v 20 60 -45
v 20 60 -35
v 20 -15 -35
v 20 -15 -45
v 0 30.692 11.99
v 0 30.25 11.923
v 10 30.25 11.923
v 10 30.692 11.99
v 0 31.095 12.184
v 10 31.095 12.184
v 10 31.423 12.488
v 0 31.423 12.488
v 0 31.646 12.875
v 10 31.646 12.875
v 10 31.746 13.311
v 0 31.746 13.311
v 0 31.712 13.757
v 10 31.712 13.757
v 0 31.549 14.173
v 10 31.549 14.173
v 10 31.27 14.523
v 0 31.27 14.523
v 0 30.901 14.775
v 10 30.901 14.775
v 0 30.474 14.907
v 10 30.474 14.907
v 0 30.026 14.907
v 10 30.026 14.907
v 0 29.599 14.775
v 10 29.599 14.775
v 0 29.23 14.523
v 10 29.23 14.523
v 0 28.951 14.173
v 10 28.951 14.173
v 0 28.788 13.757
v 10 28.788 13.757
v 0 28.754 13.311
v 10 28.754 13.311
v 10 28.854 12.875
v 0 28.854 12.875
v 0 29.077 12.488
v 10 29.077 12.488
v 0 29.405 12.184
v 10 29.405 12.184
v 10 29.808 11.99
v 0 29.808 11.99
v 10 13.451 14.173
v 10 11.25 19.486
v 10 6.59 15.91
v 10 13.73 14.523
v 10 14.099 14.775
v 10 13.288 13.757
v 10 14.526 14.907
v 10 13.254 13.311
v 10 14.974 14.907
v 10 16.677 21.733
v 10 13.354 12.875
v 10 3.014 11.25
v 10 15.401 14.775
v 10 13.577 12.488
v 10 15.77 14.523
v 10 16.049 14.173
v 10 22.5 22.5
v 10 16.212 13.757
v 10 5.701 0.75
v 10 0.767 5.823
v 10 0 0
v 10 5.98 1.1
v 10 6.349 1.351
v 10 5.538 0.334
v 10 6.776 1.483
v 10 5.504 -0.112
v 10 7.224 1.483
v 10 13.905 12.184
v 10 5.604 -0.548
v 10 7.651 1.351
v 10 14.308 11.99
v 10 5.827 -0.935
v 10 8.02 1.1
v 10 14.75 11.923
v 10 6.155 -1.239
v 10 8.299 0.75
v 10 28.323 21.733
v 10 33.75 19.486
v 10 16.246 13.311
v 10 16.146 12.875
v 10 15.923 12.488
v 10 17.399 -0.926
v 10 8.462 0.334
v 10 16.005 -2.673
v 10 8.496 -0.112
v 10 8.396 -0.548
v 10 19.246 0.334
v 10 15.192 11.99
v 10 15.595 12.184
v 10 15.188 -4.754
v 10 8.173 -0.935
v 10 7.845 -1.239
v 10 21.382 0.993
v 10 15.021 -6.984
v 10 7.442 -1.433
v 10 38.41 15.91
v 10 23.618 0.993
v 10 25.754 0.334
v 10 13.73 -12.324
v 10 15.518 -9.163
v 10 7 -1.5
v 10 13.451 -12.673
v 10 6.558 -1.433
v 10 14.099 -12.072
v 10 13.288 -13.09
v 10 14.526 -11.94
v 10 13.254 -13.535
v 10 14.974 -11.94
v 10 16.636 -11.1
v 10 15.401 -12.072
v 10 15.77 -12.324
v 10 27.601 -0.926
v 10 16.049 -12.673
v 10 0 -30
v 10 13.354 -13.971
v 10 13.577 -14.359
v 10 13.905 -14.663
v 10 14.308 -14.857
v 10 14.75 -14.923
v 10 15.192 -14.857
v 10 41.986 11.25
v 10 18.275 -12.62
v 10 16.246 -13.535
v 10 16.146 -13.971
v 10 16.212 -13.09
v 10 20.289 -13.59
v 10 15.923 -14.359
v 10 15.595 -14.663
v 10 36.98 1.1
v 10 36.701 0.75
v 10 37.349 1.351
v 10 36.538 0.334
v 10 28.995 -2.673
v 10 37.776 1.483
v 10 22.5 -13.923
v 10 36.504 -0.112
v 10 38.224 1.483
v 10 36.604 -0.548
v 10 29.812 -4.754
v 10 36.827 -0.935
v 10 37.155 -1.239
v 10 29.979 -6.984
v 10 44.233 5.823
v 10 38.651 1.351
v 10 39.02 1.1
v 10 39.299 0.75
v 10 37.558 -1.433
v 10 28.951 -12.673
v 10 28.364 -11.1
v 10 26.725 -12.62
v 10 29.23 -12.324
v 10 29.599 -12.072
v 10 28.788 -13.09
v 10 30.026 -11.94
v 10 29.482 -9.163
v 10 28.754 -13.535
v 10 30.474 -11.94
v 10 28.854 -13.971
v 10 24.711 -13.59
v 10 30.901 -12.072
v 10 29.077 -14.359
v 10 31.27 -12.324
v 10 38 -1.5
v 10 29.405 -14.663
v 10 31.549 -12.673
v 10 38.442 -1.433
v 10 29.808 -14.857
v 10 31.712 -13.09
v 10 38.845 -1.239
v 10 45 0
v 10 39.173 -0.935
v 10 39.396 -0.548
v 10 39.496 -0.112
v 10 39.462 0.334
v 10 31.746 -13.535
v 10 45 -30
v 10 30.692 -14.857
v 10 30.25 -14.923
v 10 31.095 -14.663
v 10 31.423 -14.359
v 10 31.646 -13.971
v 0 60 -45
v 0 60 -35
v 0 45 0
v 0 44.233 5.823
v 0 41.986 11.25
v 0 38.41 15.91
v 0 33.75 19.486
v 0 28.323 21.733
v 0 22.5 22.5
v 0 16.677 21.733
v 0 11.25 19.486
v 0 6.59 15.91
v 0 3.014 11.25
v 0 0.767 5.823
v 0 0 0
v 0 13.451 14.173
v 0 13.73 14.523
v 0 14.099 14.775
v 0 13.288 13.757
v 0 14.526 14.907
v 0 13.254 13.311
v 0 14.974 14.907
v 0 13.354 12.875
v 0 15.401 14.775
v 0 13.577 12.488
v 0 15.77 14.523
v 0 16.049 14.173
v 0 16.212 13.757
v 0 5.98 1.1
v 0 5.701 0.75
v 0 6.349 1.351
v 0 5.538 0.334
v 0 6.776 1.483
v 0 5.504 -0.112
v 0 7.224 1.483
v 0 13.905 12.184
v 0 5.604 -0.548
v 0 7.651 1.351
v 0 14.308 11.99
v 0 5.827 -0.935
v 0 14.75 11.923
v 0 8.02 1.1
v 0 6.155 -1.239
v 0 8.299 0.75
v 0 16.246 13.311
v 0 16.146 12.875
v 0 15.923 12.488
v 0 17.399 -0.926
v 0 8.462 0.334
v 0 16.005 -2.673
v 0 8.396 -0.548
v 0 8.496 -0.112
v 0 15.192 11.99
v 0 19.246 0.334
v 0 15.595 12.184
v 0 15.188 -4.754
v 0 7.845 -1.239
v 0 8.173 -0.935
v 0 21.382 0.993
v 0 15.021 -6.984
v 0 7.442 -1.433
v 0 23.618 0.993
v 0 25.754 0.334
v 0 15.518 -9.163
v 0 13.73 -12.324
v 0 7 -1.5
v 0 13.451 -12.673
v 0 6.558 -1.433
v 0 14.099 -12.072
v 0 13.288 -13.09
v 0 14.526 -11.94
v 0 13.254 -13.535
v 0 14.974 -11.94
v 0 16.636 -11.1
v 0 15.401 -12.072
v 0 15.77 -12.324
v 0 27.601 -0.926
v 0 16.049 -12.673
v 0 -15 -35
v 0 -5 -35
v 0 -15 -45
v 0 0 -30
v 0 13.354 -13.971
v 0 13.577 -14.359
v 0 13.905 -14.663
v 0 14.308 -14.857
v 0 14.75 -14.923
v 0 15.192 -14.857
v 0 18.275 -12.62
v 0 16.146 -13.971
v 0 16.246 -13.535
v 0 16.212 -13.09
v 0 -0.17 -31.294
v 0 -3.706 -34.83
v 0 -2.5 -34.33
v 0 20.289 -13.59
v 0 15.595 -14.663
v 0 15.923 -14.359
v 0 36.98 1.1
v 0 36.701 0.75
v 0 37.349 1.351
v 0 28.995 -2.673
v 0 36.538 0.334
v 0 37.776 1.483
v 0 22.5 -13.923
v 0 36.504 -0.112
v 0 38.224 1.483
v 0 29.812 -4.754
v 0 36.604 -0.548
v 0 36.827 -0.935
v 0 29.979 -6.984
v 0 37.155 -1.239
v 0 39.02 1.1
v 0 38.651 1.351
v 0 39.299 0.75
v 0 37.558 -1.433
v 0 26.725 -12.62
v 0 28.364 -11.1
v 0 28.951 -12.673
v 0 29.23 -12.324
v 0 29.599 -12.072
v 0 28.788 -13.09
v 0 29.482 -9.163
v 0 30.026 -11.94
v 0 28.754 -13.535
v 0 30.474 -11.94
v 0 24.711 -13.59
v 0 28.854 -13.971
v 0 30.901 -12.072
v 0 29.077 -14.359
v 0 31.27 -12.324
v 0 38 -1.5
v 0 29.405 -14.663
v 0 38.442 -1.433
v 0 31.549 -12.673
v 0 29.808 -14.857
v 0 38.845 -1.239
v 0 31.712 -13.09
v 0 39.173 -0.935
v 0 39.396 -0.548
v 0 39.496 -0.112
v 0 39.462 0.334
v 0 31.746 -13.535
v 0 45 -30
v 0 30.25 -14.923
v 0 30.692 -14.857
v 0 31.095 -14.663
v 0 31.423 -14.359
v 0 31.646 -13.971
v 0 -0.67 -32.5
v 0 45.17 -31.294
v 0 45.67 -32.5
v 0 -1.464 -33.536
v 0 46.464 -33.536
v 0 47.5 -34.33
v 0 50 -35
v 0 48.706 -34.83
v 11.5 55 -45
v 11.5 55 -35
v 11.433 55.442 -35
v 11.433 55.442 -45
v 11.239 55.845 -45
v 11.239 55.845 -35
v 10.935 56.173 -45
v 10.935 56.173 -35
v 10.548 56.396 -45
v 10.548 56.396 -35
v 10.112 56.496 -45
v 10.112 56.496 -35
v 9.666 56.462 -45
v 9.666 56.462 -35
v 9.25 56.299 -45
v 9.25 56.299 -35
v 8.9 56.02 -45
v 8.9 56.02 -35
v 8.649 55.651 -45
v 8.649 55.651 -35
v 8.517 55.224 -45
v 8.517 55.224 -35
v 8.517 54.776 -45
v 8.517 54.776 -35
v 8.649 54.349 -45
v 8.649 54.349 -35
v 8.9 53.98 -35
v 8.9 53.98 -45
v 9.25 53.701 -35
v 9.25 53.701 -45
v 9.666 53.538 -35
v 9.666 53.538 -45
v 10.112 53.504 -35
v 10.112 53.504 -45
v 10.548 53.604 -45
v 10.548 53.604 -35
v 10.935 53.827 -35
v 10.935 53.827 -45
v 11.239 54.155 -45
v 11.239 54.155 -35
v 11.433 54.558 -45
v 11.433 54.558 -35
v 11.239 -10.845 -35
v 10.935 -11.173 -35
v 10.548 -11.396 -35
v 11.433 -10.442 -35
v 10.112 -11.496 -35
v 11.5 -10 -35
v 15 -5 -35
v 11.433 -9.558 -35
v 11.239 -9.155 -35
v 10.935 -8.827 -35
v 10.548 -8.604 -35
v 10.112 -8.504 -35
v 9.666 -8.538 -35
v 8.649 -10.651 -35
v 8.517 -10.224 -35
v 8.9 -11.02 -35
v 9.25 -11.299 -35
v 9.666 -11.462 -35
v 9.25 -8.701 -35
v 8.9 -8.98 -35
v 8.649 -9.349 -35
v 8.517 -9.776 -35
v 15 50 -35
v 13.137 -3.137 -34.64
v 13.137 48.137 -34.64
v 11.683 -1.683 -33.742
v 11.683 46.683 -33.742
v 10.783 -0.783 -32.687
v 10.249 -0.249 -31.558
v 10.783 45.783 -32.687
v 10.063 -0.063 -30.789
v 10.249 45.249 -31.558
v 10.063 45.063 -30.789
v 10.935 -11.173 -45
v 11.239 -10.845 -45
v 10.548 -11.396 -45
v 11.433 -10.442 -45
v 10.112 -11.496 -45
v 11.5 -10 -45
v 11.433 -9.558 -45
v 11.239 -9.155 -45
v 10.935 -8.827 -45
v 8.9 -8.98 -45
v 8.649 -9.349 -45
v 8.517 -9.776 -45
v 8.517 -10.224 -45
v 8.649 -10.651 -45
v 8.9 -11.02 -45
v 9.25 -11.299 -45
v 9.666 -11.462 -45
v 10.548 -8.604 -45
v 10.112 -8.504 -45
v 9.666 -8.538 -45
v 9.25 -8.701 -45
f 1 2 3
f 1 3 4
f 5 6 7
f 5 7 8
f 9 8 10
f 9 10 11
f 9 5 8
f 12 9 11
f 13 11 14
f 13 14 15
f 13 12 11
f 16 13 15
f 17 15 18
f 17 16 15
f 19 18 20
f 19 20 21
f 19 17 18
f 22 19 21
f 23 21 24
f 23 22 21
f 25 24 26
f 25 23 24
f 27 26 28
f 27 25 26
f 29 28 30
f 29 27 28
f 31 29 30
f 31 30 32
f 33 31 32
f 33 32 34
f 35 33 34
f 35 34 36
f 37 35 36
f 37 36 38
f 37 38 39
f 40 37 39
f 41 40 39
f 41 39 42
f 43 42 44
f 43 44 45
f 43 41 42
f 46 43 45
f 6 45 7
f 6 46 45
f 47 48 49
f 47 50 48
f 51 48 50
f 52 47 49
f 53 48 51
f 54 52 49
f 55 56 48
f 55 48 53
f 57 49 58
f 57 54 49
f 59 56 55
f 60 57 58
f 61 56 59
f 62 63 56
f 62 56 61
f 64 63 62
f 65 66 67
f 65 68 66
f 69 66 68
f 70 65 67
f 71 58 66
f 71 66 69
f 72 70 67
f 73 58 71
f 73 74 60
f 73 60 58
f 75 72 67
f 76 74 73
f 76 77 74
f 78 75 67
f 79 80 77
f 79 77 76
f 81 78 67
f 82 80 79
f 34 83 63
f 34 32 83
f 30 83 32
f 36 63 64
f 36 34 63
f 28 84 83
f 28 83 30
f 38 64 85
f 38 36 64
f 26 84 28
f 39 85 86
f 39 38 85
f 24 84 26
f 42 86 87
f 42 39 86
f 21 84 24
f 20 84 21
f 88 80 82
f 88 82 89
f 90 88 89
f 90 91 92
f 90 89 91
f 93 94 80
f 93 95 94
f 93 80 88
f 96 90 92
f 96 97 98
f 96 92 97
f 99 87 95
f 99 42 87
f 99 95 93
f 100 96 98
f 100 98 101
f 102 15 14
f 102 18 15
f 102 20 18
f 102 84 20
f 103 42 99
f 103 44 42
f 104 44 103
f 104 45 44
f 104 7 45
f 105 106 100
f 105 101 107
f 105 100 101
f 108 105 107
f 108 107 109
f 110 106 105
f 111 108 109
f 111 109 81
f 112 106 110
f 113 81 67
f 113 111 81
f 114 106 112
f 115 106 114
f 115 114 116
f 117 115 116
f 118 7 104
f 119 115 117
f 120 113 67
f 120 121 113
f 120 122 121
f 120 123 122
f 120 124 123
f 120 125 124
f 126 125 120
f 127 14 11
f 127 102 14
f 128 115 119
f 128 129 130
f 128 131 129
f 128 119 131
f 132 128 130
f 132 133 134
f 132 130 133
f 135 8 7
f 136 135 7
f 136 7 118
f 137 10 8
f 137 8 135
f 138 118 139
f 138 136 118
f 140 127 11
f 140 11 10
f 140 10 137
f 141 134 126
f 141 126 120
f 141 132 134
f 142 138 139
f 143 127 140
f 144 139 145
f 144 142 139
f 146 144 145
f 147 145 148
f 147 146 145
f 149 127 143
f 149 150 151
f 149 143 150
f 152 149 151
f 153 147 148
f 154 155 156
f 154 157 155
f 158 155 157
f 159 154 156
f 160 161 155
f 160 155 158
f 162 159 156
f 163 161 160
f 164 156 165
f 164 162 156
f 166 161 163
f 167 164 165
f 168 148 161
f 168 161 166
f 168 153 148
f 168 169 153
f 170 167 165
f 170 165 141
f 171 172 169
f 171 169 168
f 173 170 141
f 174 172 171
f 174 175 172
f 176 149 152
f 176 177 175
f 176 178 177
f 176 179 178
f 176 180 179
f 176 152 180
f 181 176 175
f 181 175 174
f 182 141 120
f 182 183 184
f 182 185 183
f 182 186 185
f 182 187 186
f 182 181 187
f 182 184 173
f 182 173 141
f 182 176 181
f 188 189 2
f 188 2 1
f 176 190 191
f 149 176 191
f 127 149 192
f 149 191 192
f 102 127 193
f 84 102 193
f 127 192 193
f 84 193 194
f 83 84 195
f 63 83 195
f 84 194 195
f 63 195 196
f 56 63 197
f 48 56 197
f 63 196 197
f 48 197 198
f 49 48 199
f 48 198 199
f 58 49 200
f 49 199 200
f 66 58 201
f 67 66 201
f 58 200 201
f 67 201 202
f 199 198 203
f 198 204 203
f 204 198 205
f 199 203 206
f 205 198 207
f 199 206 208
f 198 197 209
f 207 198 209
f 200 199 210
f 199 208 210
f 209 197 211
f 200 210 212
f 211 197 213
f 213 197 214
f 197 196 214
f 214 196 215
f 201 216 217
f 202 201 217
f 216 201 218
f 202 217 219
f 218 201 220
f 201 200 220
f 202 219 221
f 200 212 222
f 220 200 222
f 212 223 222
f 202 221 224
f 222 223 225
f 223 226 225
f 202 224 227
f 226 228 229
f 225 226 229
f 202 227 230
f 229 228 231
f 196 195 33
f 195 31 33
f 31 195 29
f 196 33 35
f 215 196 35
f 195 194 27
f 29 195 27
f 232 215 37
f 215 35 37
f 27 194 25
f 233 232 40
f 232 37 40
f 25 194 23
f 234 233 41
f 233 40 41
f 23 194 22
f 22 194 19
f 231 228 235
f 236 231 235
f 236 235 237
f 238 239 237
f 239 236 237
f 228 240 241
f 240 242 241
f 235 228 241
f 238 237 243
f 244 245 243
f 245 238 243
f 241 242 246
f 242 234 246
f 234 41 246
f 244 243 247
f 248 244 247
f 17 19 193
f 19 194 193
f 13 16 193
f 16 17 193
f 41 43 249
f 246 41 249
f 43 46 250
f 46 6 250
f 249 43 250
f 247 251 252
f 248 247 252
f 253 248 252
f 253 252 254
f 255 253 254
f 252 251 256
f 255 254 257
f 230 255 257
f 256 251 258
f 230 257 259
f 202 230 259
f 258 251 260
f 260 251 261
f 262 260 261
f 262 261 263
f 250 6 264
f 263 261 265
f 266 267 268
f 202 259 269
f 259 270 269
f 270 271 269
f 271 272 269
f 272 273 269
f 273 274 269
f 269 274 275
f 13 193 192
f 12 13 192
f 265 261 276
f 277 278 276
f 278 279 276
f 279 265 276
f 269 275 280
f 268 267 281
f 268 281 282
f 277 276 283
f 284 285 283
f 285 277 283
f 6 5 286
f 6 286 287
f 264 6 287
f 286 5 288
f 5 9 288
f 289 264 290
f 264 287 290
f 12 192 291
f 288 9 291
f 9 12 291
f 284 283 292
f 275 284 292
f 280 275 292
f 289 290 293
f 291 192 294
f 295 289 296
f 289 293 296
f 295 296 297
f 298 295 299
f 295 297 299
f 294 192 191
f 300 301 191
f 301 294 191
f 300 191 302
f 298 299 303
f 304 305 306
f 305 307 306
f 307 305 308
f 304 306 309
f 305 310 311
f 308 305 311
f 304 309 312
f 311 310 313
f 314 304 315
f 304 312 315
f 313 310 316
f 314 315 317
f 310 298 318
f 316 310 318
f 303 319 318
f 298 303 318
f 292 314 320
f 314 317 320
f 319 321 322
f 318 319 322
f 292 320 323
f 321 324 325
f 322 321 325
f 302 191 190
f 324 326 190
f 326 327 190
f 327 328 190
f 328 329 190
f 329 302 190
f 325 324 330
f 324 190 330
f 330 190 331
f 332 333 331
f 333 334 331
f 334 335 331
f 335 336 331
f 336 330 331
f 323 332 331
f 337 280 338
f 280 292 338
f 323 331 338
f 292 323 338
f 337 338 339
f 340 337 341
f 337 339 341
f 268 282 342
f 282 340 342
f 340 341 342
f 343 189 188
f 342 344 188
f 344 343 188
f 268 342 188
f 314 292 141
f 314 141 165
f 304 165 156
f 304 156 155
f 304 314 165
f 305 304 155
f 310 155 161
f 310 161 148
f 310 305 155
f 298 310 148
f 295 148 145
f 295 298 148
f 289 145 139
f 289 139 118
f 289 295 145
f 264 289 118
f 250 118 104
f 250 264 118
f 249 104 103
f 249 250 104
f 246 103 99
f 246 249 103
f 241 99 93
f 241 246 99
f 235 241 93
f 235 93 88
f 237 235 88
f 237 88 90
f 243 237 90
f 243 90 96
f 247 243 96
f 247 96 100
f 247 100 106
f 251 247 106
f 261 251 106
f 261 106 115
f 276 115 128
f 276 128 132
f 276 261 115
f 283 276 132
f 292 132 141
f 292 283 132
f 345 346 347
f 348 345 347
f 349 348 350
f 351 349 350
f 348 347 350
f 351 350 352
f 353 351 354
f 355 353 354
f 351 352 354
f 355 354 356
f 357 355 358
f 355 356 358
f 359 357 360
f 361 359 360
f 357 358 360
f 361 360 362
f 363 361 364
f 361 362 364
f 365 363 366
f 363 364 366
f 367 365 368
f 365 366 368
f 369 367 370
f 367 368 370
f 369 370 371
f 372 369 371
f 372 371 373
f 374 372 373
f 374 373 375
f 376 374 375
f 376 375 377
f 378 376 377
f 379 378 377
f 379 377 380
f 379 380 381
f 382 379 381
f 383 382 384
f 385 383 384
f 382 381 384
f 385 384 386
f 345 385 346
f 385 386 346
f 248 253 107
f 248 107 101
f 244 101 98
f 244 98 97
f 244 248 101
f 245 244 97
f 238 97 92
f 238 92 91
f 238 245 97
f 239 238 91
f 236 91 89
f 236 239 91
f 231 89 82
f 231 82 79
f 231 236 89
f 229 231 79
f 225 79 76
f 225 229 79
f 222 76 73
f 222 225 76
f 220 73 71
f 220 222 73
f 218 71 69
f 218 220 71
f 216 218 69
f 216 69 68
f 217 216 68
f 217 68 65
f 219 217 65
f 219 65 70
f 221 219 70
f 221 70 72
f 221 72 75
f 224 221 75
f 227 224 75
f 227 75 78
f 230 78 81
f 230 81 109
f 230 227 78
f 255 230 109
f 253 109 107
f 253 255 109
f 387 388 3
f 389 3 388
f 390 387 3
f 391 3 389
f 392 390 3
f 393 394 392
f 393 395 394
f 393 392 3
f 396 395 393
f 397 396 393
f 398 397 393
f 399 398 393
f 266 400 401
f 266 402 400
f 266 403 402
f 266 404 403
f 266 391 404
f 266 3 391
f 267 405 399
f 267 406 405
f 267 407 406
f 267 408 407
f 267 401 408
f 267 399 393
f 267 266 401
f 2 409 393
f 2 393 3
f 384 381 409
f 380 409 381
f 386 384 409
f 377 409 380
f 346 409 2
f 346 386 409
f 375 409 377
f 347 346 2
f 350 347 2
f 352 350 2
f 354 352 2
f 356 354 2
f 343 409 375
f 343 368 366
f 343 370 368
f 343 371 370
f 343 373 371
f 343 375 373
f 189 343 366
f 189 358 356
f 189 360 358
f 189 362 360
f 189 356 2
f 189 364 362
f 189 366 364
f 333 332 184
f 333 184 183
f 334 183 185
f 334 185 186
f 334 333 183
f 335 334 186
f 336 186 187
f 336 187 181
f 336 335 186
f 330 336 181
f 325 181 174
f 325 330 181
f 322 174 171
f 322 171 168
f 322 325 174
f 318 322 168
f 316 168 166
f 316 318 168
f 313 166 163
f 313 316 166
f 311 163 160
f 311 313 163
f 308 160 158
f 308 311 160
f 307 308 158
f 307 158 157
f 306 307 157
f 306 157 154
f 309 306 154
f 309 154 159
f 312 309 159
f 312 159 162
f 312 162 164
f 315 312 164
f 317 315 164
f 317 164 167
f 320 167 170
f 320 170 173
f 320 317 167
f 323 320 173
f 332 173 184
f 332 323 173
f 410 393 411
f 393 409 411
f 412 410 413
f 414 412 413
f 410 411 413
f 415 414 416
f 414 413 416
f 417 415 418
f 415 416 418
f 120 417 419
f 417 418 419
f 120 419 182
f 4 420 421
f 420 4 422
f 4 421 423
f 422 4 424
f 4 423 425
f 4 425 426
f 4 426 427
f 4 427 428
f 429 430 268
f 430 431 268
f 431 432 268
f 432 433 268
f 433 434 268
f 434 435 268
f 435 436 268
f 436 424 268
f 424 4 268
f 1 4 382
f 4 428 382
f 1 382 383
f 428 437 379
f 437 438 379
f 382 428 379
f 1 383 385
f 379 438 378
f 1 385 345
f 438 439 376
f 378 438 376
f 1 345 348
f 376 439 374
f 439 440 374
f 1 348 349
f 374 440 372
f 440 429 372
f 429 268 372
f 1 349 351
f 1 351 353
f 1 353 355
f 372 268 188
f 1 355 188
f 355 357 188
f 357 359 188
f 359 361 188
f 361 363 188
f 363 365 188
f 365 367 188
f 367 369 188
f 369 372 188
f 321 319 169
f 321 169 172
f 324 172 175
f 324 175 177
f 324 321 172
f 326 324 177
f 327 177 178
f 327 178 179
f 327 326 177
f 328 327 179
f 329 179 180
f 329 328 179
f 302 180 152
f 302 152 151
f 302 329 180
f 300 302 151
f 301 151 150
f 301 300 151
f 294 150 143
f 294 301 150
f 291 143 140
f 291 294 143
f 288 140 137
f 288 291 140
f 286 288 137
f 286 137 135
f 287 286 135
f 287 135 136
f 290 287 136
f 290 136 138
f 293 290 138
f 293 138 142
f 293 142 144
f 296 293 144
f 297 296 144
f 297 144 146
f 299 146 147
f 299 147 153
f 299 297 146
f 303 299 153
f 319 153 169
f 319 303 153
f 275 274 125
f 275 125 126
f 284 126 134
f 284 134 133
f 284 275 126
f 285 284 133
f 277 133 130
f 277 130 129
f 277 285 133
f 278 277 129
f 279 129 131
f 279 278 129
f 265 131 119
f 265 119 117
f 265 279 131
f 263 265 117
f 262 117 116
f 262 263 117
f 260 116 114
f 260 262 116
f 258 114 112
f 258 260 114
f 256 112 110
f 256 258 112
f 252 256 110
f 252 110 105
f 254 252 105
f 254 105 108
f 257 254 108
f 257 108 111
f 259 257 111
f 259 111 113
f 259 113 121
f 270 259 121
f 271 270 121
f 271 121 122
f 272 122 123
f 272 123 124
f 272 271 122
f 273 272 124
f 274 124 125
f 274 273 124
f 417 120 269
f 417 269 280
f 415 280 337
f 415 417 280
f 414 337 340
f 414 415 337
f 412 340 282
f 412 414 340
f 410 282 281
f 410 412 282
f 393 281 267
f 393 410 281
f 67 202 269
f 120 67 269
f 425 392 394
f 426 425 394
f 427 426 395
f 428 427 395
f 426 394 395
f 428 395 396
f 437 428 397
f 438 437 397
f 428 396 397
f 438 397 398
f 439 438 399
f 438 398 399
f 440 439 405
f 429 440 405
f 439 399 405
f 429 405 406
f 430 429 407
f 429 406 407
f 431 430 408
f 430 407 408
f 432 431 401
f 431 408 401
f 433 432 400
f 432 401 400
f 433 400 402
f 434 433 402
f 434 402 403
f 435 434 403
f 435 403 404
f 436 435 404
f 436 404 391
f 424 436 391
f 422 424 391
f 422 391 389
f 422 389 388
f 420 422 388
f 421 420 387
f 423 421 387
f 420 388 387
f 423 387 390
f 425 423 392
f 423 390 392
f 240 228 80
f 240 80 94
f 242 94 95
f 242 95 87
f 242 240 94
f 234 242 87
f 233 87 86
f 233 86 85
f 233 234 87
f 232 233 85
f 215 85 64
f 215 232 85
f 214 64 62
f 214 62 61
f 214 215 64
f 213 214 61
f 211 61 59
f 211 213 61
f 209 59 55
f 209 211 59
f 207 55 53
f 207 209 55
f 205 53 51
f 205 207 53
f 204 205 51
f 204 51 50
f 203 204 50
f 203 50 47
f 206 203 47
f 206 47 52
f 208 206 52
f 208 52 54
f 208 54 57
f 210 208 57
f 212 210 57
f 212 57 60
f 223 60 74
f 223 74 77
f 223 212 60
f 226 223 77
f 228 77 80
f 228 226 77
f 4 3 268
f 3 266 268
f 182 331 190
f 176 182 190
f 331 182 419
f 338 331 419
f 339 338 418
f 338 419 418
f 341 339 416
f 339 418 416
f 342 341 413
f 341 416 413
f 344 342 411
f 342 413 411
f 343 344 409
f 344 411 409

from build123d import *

# Parameters (mm, degrees)
SKETCH1_R           = 7.5
SKETCH1_R_2         = 1.5
BOSS_EXTRUDE1_DEPTH = 10
FILLET1_R           = 5
FILLET2_R           = 5
SKETCH2_W           = 10
SKETCH2_H           = 75
BOSS_EXTRUDE2_DEPTH = 10
FILLET3_R           = 5
SKETCH3_R           = 1.5
CUT_EXTRUDE1_DEPTH  = 10


with BuildPart() as part:
    # Sketch1 → Boss-Extrude1 (new body)
    with BuildSketch(Plane(origin=(0, 0, 0), x_dir=(0, 0, -1), z_dir=(1, 0, 0))):
        with BuildLine():
            Line((0, 0), (35, 0))
            Line((35, 0), (35, -15))
            Line((35, -15), (45, -15))
            Line((45, -15), (45, 60))
            Line((45, 60), (35, 60))
            Line((35, 60), (35, 45))
            Line((35, 45), (0, 45))
            ThreePointArc((0, 45), (-22.5, 22.5), (0, 0))
        make_face()
        with Locations((6.423393759, 22.5)):
            Circle(SKETCH1_R, mode=Mode.SUBTRACT)
        with Locations((13.423393759, 30.25)):
            Circle(SKETCH1_R_2, mode=Mode.SUBTRACT)
        with Locations((0, 38)):
            Circle(SKETCH1_R_2, mode=Mode.SUBTRACT)
        with Locations((-13.423393759, 30.25)):
            Circle(SKETCH1_R_2, mode=Mode.SUBTRACT)
        with Locations((-13.423393759, 14.75)):
            Circle(SKETCH1_R_2, mode=Mode.SUBTRACT)
        with Locations((0, 7)):
            Circle(SKETCH1_R_2, mode=Mode.SUBTRACT)
        with Locations((13.423393759, 14.75)):
            Circle(SKETCH1_R_2, mode=Mode.SUBTRACT)
    extrude(amount=BOSS_EXTRUDE1_DEPTH)

    # Fillet1
    fillet1_edges = [part.edges().sort_by_distance(p)[0] for p in [
        (5, 45, -35),
    ]]
    fillet(fillet1_edges, radius=FILLET1_R)

    # Fillet2
    fillet2_edges = [part.edges().sort_by_distance(p)[0] for p in [
        (5, 0, -35),
    ]]
    fillet(fillet2_edges, radius=FILLET2_R)

    # Sketch2 → Boss-Extrude2 (add)
    with BuildSketch(Plane(origin=(10, 0, 0), x_dir=(0, 0, -1), z_dir=(1, 0, 0))):
        with Locations((40, 22.5)):
            Rectangle(SKETCH2_W, SKETCH2_H)
    extrude(amount=BOSS_EXTRUDE2_DEPTH)

    # Fillet3
    fillet3_edges = [part.edges().sort_by_distance(p)[0] for p in [
        (10, 22.5, -35),
    ]]
    fillet(fillet3_edges, radius=FILLET3_R)

    # Sketch3 → Cut-Extrude1 (cut)
    with BuildSketch(Plane.XY.offset(-35)):
        with Locations((10, -10)):
            Circle(SKETCH3_R)
        with Locations((10, 55)):
            Circle(SKETCH3_R)
    extrude(amount=-CUT_EXTRUDE1_DEPTH, mode=Mode.SUBTRACT)


solid = part.part
